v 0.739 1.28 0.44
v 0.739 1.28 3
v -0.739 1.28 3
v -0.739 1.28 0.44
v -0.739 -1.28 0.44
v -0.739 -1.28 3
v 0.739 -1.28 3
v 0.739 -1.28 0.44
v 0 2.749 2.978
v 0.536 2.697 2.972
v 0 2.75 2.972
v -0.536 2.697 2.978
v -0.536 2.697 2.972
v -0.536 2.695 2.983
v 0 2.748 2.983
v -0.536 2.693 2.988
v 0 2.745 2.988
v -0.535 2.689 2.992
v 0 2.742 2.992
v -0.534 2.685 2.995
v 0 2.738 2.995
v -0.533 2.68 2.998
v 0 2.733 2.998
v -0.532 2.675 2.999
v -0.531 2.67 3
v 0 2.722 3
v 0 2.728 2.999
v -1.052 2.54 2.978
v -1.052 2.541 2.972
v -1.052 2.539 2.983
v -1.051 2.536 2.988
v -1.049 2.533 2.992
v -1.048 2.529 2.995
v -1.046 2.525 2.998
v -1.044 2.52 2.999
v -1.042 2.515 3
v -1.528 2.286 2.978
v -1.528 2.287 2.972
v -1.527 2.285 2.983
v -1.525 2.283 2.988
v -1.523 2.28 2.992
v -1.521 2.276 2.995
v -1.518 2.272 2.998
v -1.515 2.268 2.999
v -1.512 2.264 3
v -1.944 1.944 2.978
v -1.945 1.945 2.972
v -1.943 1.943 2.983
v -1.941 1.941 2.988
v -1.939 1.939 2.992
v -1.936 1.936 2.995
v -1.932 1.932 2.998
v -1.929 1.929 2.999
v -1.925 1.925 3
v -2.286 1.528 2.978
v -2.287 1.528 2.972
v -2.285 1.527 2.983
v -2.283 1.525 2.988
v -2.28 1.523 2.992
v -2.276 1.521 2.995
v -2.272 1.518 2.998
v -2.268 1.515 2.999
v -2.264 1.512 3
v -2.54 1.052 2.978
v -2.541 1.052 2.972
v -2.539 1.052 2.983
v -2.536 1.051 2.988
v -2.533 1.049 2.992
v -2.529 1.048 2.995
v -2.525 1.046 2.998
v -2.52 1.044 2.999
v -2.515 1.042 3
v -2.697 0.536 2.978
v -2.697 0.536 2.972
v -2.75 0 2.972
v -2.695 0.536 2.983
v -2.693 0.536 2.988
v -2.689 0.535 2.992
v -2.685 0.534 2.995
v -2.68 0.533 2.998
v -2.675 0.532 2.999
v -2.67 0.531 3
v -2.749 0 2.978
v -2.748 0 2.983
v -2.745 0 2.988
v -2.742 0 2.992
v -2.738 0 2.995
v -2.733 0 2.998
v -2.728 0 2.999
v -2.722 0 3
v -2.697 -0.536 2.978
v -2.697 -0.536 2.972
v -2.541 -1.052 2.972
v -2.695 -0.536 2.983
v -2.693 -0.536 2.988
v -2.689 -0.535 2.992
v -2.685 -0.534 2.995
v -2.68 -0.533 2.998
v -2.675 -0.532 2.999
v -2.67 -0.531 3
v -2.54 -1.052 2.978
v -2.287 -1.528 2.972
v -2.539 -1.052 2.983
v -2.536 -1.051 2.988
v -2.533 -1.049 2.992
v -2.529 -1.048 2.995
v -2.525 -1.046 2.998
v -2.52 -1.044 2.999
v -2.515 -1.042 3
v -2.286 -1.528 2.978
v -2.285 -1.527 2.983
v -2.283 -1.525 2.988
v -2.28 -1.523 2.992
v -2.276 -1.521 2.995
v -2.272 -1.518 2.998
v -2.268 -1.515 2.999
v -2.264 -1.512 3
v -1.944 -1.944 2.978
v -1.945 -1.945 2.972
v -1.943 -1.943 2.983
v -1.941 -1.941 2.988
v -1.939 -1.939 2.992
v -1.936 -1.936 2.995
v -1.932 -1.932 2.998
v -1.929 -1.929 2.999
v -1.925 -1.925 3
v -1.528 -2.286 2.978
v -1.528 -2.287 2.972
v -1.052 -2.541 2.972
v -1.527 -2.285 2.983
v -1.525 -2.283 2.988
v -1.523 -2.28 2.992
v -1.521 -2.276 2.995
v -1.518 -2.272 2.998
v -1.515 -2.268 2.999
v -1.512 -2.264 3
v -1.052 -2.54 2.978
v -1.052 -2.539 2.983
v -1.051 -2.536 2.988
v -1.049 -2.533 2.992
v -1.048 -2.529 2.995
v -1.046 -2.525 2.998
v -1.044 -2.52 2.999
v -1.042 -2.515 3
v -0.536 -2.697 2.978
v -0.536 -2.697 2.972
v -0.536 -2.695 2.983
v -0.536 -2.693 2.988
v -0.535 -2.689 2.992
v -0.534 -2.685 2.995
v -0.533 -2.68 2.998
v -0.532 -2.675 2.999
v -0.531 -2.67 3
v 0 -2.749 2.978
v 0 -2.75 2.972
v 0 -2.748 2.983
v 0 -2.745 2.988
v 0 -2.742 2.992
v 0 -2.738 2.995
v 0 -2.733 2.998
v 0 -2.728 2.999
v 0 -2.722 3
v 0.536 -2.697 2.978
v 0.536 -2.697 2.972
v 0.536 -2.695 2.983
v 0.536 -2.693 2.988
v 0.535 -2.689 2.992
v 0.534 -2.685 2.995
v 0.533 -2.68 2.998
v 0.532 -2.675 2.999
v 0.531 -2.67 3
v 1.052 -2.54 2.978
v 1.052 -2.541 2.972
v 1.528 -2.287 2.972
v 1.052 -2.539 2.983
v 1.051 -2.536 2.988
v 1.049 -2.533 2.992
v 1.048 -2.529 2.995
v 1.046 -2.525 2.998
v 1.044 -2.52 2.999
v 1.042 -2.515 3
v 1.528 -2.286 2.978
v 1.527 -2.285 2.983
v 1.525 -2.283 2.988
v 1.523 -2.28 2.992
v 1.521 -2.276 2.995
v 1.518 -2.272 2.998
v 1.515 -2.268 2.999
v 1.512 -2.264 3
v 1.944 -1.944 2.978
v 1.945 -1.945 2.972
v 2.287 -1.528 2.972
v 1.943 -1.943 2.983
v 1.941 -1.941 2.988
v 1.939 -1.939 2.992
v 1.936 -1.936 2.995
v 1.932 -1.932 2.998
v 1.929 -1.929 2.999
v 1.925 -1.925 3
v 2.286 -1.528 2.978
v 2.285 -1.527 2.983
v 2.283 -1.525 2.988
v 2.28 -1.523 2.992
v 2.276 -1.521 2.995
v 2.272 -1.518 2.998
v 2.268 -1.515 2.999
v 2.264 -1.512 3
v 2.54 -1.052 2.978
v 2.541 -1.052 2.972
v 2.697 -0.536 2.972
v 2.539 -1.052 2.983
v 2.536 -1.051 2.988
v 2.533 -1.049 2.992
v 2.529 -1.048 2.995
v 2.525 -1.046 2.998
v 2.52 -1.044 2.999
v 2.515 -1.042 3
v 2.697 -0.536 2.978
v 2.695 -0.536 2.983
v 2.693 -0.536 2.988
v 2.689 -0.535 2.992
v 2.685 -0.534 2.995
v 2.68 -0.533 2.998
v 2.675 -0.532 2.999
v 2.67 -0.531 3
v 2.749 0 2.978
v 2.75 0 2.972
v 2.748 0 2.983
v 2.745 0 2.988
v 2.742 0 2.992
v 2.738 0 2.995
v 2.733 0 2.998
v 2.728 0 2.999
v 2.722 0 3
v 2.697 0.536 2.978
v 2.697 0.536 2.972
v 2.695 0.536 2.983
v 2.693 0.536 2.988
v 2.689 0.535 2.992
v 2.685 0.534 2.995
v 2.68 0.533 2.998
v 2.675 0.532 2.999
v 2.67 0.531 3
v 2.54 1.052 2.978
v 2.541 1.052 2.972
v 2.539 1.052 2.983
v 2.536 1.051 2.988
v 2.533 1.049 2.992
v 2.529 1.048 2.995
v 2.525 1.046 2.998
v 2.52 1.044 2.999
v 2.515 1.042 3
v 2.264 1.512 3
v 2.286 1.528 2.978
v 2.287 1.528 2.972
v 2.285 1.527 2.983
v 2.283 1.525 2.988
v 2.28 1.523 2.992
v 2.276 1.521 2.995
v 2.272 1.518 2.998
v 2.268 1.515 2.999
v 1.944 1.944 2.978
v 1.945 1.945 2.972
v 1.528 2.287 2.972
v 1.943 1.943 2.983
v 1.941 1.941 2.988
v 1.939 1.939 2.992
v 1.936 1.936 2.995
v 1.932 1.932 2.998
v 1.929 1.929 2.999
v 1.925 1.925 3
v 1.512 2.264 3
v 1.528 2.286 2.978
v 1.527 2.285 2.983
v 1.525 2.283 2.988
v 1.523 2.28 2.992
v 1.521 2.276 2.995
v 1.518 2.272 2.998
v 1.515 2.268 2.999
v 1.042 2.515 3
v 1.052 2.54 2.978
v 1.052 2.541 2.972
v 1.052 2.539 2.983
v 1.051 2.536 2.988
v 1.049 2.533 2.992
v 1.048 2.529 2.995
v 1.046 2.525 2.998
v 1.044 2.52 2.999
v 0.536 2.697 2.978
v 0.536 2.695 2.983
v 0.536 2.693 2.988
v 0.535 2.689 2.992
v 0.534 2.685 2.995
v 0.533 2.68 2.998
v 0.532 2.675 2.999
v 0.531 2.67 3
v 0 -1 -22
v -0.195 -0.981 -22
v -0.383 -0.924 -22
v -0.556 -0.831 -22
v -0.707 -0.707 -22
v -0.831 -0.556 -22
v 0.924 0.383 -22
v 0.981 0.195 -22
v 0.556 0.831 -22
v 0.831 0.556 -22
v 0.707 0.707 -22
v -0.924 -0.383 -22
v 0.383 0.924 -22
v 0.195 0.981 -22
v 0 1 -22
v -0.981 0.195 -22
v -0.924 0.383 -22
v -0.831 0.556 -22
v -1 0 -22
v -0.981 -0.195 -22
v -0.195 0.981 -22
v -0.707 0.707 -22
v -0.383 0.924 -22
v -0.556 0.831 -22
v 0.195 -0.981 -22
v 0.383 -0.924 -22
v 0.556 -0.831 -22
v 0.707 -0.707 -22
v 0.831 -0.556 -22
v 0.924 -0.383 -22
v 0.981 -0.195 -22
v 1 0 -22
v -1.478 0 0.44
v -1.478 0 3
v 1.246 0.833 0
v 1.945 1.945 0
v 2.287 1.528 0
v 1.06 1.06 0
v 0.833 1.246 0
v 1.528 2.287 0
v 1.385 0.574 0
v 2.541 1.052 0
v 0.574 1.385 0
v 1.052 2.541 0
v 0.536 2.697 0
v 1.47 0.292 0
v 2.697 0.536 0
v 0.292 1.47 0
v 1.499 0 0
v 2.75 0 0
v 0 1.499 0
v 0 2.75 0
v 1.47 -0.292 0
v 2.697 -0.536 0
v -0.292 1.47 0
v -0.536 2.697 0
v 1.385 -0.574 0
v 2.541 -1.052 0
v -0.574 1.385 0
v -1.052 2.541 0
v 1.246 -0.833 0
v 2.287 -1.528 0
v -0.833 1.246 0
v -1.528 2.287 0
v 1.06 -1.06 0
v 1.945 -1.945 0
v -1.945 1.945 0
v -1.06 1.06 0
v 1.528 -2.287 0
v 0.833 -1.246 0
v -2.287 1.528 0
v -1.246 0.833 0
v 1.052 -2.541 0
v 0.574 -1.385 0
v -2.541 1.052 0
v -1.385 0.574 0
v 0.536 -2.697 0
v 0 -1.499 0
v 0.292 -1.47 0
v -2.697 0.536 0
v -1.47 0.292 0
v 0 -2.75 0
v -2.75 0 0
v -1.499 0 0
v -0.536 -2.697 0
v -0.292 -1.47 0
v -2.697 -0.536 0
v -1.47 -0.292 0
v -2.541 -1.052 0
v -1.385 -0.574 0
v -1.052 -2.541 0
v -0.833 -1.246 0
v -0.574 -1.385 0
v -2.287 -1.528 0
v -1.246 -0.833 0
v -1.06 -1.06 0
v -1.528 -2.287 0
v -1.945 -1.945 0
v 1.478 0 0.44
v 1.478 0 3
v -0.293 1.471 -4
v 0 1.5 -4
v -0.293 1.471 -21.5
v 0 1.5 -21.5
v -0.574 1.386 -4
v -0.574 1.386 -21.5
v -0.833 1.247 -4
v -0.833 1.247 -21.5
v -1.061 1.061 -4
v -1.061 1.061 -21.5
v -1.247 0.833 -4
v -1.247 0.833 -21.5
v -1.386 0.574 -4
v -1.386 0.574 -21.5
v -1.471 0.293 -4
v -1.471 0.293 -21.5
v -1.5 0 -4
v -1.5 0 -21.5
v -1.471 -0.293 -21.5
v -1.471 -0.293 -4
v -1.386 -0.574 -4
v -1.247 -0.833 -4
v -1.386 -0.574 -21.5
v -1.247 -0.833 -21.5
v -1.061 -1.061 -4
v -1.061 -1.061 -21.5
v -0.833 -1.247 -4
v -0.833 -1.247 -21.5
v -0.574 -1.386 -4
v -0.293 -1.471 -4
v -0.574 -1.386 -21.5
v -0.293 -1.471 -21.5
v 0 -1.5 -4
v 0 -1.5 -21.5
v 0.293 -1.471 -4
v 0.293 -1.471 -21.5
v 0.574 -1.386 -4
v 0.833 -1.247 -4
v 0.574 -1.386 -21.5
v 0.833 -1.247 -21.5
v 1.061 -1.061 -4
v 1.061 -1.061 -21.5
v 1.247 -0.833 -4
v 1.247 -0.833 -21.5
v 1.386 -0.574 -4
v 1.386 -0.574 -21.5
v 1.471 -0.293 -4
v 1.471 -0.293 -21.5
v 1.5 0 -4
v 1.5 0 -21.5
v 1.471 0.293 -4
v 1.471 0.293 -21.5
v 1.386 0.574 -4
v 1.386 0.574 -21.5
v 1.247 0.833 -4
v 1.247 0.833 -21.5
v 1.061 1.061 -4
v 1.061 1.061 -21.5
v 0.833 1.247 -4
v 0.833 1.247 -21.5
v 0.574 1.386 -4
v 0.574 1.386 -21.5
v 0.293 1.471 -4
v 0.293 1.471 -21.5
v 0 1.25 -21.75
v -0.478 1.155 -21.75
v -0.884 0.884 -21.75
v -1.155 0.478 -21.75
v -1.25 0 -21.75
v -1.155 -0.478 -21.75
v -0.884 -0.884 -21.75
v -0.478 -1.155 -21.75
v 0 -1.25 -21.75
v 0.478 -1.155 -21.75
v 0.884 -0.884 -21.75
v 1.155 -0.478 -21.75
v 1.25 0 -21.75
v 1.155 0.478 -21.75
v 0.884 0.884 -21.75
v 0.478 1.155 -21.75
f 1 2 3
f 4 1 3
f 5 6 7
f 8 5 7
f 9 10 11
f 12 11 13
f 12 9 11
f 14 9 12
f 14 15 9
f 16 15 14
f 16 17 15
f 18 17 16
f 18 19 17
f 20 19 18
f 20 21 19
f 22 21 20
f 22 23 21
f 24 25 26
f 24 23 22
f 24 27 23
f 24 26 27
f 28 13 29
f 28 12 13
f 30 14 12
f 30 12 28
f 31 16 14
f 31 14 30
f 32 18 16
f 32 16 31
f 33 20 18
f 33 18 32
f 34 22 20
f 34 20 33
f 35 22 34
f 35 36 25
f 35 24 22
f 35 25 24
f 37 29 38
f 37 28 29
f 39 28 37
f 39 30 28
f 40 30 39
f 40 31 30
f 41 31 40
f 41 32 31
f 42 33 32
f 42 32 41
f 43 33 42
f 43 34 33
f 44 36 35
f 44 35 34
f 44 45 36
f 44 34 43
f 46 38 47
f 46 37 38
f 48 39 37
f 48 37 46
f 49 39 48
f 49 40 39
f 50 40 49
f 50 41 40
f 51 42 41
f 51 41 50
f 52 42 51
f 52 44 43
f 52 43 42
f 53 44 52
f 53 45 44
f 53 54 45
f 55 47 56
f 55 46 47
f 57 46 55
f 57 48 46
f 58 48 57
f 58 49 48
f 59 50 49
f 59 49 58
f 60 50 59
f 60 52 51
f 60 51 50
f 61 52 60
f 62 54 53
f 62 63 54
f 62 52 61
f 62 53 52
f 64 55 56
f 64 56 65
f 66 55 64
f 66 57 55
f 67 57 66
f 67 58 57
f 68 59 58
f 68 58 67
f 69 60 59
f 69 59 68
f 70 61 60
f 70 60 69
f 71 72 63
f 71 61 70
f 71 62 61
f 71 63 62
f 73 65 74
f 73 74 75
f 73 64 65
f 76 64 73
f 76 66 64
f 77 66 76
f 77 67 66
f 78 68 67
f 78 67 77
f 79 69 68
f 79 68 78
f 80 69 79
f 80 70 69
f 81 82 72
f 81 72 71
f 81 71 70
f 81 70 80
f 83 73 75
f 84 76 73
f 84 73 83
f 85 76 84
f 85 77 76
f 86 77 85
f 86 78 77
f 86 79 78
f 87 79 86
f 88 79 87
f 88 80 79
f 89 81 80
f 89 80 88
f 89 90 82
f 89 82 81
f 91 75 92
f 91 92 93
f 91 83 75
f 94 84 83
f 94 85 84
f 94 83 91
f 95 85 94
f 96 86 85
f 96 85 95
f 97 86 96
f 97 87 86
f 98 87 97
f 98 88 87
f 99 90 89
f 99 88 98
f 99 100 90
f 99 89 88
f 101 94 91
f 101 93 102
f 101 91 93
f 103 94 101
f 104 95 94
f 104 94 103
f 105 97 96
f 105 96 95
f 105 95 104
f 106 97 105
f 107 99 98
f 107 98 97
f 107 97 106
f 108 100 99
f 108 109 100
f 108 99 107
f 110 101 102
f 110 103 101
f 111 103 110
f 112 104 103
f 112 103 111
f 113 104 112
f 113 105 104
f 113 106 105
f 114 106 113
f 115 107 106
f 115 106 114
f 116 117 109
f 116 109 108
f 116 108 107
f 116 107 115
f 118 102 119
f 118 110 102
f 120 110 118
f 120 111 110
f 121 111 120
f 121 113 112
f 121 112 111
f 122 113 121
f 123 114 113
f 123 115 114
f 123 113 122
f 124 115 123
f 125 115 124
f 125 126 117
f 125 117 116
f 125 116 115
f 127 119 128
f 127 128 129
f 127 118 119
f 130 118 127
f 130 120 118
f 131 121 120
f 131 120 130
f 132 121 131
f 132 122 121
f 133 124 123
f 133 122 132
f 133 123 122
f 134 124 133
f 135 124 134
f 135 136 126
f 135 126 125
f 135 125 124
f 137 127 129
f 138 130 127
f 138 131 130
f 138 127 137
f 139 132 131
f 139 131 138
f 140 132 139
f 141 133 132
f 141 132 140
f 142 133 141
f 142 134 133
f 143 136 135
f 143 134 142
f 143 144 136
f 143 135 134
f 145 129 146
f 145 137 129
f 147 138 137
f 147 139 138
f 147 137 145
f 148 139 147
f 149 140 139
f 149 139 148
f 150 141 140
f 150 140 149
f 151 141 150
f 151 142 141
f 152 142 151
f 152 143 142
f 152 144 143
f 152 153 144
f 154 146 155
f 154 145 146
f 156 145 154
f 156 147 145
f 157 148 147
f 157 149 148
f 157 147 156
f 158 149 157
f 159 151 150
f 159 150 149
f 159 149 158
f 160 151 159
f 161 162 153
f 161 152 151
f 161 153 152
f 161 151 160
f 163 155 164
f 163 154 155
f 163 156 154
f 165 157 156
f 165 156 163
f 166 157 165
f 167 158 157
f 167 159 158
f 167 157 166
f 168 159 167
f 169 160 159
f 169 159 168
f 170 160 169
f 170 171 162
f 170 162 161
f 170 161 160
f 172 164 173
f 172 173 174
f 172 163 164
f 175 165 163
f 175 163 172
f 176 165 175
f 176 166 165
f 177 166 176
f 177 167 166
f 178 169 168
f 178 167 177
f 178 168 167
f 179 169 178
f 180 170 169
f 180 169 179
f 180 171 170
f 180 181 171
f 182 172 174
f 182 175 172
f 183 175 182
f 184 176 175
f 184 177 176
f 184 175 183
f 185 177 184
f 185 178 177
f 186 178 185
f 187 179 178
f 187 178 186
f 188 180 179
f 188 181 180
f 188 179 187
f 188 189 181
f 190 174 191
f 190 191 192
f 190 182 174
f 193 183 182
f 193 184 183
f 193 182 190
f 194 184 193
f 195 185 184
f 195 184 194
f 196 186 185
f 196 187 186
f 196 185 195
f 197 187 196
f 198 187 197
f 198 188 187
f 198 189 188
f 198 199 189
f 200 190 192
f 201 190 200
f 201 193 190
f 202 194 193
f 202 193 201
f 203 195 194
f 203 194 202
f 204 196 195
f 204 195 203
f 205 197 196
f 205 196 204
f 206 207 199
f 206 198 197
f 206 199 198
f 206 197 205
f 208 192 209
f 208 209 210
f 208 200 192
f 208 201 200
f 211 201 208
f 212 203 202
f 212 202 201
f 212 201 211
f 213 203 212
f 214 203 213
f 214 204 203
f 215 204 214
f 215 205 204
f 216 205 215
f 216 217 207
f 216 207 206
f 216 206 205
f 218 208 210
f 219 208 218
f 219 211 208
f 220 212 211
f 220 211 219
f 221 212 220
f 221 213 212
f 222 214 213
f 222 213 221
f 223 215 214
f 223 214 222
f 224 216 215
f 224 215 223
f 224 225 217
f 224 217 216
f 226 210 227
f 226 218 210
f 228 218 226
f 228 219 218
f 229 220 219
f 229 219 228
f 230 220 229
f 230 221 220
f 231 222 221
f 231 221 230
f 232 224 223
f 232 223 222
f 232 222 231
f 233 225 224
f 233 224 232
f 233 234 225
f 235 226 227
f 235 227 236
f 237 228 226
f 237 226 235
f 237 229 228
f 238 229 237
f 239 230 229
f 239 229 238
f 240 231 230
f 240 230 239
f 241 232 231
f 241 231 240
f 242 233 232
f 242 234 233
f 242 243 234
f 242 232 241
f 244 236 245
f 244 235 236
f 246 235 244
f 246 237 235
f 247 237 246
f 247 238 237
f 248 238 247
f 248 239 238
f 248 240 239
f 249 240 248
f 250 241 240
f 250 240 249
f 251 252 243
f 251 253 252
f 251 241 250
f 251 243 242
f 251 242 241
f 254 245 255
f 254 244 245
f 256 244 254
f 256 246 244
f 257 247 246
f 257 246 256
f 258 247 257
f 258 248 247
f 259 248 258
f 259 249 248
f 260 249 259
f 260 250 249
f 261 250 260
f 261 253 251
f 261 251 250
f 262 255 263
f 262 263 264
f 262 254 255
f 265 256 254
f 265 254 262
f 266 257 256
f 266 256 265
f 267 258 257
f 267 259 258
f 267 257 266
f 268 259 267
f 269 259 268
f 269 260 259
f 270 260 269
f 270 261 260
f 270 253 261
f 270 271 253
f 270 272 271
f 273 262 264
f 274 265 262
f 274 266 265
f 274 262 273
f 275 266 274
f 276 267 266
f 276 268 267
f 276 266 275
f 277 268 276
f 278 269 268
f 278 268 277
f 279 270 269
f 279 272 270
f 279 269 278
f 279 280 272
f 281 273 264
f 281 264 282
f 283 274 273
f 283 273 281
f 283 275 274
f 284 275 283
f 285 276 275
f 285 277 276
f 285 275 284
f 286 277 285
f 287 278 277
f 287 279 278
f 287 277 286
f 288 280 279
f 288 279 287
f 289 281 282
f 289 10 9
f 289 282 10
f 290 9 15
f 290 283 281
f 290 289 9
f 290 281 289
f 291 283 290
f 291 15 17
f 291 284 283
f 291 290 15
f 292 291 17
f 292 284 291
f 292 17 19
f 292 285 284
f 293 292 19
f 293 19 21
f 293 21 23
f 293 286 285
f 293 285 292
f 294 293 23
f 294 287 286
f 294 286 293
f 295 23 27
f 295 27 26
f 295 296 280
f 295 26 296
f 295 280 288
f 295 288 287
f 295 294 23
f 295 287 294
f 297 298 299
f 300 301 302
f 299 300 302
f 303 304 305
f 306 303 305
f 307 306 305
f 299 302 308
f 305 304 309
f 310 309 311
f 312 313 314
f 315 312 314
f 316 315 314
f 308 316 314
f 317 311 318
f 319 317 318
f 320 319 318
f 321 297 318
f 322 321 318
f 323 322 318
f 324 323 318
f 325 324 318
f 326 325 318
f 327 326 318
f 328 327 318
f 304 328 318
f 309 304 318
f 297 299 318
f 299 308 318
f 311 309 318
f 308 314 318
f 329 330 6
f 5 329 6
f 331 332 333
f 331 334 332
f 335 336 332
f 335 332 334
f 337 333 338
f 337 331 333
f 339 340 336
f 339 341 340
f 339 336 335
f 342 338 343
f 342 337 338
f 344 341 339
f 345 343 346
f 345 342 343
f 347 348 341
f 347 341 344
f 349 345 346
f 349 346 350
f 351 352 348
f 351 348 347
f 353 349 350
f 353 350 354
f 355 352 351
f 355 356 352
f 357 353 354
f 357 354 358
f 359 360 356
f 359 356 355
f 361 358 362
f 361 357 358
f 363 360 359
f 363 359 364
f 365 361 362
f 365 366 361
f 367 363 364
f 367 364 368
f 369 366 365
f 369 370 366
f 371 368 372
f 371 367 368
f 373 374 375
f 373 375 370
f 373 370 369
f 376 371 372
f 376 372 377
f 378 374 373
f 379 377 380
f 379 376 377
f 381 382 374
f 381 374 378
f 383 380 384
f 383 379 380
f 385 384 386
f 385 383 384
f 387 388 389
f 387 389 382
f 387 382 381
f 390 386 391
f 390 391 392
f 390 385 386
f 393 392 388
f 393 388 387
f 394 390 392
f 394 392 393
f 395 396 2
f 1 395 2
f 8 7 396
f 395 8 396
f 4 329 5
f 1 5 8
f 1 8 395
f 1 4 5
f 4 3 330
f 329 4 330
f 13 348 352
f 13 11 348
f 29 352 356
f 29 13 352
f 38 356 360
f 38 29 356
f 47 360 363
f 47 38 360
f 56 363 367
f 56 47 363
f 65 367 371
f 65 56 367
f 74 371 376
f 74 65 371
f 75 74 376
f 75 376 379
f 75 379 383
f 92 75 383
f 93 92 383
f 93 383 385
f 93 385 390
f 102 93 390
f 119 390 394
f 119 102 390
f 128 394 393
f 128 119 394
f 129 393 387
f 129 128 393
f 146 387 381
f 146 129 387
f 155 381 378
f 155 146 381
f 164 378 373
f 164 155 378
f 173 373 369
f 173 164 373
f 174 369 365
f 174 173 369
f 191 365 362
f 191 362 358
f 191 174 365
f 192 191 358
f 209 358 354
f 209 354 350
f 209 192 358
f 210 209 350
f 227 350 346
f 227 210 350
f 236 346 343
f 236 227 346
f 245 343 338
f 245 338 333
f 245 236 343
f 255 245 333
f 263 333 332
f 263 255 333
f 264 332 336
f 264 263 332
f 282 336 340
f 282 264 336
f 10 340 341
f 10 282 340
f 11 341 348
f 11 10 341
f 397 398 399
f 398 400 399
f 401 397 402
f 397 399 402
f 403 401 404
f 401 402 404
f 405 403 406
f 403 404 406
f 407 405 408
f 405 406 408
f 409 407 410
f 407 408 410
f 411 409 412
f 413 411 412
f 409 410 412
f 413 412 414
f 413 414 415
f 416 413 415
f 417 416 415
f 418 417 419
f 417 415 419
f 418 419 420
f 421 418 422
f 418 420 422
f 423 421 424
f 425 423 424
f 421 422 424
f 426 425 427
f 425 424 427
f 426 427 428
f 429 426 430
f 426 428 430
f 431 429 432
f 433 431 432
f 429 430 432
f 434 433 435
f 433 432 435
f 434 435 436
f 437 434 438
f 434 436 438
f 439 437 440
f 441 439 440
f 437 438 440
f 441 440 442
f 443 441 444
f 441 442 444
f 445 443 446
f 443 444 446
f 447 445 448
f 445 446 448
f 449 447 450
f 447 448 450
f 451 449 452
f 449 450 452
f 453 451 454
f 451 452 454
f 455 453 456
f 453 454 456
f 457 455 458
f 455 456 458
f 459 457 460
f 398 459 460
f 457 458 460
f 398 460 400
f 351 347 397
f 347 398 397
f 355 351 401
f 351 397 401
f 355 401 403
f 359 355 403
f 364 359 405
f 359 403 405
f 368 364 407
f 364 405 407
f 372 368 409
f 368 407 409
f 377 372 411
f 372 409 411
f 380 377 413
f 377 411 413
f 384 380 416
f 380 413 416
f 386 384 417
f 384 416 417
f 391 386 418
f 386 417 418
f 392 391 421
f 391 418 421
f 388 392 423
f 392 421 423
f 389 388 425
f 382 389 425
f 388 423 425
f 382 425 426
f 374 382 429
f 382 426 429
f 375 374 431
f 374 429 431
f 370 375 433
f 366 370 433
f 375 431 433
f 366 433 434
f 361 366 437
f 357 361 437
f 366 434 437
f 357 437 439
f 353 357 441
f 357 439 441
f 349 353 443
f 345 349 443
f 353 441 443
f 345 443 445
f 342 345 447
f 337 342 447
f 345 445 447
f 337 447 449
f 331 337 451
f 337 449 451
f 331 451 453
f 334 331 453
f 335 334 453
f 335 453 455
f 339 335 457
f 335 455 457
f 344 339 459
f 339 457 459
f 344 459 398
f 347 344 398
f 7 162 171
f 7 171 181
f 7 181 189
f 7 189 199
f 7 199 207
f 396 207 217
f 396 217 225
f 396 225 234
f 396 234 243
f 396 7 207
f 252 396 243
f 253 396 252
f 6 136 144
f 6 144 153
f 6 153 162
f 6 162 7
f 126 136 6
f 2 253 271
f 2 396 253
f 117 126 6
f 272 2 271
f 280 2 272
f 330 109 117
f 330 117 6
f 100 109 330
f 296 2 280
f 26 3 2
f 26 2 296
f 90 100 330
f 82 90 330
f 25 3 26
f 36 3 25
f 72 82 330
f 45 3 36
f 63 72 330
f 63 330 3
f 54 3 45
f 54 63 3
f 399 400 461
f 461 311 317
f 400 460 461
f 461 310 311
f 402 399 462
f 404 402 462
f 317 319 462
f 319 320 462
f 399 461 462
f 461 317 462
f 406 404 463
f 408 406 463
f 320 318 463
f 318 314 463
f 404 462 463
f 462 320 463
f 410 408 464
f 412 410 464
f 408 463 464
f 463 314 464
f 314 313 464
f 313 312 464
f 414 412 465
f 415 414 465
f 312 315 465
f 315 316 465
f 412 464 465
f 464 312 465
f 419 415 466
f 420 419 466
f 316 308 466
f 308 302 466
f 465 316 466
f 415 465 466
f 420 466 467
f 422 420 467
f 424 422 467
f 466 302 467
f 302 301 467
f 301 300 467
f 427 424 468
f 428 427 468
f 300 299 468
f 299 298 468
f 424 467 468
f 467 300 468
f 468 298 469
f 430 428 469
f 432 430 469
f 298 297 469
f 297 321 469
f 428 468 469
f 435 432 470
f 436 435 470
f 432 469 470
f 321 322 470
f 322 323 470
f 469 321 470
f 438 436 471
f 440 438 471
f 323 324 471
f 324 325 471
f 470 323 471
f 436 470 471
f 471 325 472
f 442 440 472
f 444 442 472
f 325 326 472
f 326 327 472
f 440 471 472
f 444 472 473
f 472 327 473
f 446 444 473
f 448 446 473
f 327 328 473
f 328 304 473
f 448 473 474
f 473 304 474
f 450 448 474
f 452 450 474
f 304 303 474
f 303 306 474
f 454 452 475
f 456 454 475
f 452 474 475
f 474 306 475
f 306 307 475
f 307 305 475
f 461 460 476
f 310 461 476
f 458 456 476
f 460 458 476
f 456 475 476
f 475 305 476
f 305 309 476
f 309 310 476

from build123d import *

# Parameters (mm, degrees)
POCKET_DEPTH = 2.56


with BuildPart() as part:
    # Sketch → Revolve (revolve)
    with BuildSketch(Plane.YZ):
        with BuildLine():
            Line((1.499, 0), (2.75, 0))
            Line((2.75, 0), (2.75, 2.97229))
            ThreePointArc((2.75, 2.97229), (2.741884, 2.991884), (2.72229, 3))
            Line((2.72229, 3), (0, 3))
            Line((0, -22), (0, 3))
            Line((1, -22), (0, -22))
            Line((1.5, -21.5), (1, -22))
            Line((1.5, -4), (1.5, -21.5))
            Line((1.499, 0), (1.5, -4))
        make_face()
    revolve(axis=Axis((0, 0, 0), (0, 0, 1)))

    # Sketch001 → Pocket (cut)
    with BuildSketch(Plane.XY.offset(3)):
        Polygon((1.478017, 0), (0.739008, 1.28), (-0.739008, 1.28), (-1.478017, 0), (-0.739008, -1.28), (0.739008, -1.28), align=None)
    extrude(amount=-POCKET_DEPTH, mode=Mode.SUBTRACT)


solid = part.part
